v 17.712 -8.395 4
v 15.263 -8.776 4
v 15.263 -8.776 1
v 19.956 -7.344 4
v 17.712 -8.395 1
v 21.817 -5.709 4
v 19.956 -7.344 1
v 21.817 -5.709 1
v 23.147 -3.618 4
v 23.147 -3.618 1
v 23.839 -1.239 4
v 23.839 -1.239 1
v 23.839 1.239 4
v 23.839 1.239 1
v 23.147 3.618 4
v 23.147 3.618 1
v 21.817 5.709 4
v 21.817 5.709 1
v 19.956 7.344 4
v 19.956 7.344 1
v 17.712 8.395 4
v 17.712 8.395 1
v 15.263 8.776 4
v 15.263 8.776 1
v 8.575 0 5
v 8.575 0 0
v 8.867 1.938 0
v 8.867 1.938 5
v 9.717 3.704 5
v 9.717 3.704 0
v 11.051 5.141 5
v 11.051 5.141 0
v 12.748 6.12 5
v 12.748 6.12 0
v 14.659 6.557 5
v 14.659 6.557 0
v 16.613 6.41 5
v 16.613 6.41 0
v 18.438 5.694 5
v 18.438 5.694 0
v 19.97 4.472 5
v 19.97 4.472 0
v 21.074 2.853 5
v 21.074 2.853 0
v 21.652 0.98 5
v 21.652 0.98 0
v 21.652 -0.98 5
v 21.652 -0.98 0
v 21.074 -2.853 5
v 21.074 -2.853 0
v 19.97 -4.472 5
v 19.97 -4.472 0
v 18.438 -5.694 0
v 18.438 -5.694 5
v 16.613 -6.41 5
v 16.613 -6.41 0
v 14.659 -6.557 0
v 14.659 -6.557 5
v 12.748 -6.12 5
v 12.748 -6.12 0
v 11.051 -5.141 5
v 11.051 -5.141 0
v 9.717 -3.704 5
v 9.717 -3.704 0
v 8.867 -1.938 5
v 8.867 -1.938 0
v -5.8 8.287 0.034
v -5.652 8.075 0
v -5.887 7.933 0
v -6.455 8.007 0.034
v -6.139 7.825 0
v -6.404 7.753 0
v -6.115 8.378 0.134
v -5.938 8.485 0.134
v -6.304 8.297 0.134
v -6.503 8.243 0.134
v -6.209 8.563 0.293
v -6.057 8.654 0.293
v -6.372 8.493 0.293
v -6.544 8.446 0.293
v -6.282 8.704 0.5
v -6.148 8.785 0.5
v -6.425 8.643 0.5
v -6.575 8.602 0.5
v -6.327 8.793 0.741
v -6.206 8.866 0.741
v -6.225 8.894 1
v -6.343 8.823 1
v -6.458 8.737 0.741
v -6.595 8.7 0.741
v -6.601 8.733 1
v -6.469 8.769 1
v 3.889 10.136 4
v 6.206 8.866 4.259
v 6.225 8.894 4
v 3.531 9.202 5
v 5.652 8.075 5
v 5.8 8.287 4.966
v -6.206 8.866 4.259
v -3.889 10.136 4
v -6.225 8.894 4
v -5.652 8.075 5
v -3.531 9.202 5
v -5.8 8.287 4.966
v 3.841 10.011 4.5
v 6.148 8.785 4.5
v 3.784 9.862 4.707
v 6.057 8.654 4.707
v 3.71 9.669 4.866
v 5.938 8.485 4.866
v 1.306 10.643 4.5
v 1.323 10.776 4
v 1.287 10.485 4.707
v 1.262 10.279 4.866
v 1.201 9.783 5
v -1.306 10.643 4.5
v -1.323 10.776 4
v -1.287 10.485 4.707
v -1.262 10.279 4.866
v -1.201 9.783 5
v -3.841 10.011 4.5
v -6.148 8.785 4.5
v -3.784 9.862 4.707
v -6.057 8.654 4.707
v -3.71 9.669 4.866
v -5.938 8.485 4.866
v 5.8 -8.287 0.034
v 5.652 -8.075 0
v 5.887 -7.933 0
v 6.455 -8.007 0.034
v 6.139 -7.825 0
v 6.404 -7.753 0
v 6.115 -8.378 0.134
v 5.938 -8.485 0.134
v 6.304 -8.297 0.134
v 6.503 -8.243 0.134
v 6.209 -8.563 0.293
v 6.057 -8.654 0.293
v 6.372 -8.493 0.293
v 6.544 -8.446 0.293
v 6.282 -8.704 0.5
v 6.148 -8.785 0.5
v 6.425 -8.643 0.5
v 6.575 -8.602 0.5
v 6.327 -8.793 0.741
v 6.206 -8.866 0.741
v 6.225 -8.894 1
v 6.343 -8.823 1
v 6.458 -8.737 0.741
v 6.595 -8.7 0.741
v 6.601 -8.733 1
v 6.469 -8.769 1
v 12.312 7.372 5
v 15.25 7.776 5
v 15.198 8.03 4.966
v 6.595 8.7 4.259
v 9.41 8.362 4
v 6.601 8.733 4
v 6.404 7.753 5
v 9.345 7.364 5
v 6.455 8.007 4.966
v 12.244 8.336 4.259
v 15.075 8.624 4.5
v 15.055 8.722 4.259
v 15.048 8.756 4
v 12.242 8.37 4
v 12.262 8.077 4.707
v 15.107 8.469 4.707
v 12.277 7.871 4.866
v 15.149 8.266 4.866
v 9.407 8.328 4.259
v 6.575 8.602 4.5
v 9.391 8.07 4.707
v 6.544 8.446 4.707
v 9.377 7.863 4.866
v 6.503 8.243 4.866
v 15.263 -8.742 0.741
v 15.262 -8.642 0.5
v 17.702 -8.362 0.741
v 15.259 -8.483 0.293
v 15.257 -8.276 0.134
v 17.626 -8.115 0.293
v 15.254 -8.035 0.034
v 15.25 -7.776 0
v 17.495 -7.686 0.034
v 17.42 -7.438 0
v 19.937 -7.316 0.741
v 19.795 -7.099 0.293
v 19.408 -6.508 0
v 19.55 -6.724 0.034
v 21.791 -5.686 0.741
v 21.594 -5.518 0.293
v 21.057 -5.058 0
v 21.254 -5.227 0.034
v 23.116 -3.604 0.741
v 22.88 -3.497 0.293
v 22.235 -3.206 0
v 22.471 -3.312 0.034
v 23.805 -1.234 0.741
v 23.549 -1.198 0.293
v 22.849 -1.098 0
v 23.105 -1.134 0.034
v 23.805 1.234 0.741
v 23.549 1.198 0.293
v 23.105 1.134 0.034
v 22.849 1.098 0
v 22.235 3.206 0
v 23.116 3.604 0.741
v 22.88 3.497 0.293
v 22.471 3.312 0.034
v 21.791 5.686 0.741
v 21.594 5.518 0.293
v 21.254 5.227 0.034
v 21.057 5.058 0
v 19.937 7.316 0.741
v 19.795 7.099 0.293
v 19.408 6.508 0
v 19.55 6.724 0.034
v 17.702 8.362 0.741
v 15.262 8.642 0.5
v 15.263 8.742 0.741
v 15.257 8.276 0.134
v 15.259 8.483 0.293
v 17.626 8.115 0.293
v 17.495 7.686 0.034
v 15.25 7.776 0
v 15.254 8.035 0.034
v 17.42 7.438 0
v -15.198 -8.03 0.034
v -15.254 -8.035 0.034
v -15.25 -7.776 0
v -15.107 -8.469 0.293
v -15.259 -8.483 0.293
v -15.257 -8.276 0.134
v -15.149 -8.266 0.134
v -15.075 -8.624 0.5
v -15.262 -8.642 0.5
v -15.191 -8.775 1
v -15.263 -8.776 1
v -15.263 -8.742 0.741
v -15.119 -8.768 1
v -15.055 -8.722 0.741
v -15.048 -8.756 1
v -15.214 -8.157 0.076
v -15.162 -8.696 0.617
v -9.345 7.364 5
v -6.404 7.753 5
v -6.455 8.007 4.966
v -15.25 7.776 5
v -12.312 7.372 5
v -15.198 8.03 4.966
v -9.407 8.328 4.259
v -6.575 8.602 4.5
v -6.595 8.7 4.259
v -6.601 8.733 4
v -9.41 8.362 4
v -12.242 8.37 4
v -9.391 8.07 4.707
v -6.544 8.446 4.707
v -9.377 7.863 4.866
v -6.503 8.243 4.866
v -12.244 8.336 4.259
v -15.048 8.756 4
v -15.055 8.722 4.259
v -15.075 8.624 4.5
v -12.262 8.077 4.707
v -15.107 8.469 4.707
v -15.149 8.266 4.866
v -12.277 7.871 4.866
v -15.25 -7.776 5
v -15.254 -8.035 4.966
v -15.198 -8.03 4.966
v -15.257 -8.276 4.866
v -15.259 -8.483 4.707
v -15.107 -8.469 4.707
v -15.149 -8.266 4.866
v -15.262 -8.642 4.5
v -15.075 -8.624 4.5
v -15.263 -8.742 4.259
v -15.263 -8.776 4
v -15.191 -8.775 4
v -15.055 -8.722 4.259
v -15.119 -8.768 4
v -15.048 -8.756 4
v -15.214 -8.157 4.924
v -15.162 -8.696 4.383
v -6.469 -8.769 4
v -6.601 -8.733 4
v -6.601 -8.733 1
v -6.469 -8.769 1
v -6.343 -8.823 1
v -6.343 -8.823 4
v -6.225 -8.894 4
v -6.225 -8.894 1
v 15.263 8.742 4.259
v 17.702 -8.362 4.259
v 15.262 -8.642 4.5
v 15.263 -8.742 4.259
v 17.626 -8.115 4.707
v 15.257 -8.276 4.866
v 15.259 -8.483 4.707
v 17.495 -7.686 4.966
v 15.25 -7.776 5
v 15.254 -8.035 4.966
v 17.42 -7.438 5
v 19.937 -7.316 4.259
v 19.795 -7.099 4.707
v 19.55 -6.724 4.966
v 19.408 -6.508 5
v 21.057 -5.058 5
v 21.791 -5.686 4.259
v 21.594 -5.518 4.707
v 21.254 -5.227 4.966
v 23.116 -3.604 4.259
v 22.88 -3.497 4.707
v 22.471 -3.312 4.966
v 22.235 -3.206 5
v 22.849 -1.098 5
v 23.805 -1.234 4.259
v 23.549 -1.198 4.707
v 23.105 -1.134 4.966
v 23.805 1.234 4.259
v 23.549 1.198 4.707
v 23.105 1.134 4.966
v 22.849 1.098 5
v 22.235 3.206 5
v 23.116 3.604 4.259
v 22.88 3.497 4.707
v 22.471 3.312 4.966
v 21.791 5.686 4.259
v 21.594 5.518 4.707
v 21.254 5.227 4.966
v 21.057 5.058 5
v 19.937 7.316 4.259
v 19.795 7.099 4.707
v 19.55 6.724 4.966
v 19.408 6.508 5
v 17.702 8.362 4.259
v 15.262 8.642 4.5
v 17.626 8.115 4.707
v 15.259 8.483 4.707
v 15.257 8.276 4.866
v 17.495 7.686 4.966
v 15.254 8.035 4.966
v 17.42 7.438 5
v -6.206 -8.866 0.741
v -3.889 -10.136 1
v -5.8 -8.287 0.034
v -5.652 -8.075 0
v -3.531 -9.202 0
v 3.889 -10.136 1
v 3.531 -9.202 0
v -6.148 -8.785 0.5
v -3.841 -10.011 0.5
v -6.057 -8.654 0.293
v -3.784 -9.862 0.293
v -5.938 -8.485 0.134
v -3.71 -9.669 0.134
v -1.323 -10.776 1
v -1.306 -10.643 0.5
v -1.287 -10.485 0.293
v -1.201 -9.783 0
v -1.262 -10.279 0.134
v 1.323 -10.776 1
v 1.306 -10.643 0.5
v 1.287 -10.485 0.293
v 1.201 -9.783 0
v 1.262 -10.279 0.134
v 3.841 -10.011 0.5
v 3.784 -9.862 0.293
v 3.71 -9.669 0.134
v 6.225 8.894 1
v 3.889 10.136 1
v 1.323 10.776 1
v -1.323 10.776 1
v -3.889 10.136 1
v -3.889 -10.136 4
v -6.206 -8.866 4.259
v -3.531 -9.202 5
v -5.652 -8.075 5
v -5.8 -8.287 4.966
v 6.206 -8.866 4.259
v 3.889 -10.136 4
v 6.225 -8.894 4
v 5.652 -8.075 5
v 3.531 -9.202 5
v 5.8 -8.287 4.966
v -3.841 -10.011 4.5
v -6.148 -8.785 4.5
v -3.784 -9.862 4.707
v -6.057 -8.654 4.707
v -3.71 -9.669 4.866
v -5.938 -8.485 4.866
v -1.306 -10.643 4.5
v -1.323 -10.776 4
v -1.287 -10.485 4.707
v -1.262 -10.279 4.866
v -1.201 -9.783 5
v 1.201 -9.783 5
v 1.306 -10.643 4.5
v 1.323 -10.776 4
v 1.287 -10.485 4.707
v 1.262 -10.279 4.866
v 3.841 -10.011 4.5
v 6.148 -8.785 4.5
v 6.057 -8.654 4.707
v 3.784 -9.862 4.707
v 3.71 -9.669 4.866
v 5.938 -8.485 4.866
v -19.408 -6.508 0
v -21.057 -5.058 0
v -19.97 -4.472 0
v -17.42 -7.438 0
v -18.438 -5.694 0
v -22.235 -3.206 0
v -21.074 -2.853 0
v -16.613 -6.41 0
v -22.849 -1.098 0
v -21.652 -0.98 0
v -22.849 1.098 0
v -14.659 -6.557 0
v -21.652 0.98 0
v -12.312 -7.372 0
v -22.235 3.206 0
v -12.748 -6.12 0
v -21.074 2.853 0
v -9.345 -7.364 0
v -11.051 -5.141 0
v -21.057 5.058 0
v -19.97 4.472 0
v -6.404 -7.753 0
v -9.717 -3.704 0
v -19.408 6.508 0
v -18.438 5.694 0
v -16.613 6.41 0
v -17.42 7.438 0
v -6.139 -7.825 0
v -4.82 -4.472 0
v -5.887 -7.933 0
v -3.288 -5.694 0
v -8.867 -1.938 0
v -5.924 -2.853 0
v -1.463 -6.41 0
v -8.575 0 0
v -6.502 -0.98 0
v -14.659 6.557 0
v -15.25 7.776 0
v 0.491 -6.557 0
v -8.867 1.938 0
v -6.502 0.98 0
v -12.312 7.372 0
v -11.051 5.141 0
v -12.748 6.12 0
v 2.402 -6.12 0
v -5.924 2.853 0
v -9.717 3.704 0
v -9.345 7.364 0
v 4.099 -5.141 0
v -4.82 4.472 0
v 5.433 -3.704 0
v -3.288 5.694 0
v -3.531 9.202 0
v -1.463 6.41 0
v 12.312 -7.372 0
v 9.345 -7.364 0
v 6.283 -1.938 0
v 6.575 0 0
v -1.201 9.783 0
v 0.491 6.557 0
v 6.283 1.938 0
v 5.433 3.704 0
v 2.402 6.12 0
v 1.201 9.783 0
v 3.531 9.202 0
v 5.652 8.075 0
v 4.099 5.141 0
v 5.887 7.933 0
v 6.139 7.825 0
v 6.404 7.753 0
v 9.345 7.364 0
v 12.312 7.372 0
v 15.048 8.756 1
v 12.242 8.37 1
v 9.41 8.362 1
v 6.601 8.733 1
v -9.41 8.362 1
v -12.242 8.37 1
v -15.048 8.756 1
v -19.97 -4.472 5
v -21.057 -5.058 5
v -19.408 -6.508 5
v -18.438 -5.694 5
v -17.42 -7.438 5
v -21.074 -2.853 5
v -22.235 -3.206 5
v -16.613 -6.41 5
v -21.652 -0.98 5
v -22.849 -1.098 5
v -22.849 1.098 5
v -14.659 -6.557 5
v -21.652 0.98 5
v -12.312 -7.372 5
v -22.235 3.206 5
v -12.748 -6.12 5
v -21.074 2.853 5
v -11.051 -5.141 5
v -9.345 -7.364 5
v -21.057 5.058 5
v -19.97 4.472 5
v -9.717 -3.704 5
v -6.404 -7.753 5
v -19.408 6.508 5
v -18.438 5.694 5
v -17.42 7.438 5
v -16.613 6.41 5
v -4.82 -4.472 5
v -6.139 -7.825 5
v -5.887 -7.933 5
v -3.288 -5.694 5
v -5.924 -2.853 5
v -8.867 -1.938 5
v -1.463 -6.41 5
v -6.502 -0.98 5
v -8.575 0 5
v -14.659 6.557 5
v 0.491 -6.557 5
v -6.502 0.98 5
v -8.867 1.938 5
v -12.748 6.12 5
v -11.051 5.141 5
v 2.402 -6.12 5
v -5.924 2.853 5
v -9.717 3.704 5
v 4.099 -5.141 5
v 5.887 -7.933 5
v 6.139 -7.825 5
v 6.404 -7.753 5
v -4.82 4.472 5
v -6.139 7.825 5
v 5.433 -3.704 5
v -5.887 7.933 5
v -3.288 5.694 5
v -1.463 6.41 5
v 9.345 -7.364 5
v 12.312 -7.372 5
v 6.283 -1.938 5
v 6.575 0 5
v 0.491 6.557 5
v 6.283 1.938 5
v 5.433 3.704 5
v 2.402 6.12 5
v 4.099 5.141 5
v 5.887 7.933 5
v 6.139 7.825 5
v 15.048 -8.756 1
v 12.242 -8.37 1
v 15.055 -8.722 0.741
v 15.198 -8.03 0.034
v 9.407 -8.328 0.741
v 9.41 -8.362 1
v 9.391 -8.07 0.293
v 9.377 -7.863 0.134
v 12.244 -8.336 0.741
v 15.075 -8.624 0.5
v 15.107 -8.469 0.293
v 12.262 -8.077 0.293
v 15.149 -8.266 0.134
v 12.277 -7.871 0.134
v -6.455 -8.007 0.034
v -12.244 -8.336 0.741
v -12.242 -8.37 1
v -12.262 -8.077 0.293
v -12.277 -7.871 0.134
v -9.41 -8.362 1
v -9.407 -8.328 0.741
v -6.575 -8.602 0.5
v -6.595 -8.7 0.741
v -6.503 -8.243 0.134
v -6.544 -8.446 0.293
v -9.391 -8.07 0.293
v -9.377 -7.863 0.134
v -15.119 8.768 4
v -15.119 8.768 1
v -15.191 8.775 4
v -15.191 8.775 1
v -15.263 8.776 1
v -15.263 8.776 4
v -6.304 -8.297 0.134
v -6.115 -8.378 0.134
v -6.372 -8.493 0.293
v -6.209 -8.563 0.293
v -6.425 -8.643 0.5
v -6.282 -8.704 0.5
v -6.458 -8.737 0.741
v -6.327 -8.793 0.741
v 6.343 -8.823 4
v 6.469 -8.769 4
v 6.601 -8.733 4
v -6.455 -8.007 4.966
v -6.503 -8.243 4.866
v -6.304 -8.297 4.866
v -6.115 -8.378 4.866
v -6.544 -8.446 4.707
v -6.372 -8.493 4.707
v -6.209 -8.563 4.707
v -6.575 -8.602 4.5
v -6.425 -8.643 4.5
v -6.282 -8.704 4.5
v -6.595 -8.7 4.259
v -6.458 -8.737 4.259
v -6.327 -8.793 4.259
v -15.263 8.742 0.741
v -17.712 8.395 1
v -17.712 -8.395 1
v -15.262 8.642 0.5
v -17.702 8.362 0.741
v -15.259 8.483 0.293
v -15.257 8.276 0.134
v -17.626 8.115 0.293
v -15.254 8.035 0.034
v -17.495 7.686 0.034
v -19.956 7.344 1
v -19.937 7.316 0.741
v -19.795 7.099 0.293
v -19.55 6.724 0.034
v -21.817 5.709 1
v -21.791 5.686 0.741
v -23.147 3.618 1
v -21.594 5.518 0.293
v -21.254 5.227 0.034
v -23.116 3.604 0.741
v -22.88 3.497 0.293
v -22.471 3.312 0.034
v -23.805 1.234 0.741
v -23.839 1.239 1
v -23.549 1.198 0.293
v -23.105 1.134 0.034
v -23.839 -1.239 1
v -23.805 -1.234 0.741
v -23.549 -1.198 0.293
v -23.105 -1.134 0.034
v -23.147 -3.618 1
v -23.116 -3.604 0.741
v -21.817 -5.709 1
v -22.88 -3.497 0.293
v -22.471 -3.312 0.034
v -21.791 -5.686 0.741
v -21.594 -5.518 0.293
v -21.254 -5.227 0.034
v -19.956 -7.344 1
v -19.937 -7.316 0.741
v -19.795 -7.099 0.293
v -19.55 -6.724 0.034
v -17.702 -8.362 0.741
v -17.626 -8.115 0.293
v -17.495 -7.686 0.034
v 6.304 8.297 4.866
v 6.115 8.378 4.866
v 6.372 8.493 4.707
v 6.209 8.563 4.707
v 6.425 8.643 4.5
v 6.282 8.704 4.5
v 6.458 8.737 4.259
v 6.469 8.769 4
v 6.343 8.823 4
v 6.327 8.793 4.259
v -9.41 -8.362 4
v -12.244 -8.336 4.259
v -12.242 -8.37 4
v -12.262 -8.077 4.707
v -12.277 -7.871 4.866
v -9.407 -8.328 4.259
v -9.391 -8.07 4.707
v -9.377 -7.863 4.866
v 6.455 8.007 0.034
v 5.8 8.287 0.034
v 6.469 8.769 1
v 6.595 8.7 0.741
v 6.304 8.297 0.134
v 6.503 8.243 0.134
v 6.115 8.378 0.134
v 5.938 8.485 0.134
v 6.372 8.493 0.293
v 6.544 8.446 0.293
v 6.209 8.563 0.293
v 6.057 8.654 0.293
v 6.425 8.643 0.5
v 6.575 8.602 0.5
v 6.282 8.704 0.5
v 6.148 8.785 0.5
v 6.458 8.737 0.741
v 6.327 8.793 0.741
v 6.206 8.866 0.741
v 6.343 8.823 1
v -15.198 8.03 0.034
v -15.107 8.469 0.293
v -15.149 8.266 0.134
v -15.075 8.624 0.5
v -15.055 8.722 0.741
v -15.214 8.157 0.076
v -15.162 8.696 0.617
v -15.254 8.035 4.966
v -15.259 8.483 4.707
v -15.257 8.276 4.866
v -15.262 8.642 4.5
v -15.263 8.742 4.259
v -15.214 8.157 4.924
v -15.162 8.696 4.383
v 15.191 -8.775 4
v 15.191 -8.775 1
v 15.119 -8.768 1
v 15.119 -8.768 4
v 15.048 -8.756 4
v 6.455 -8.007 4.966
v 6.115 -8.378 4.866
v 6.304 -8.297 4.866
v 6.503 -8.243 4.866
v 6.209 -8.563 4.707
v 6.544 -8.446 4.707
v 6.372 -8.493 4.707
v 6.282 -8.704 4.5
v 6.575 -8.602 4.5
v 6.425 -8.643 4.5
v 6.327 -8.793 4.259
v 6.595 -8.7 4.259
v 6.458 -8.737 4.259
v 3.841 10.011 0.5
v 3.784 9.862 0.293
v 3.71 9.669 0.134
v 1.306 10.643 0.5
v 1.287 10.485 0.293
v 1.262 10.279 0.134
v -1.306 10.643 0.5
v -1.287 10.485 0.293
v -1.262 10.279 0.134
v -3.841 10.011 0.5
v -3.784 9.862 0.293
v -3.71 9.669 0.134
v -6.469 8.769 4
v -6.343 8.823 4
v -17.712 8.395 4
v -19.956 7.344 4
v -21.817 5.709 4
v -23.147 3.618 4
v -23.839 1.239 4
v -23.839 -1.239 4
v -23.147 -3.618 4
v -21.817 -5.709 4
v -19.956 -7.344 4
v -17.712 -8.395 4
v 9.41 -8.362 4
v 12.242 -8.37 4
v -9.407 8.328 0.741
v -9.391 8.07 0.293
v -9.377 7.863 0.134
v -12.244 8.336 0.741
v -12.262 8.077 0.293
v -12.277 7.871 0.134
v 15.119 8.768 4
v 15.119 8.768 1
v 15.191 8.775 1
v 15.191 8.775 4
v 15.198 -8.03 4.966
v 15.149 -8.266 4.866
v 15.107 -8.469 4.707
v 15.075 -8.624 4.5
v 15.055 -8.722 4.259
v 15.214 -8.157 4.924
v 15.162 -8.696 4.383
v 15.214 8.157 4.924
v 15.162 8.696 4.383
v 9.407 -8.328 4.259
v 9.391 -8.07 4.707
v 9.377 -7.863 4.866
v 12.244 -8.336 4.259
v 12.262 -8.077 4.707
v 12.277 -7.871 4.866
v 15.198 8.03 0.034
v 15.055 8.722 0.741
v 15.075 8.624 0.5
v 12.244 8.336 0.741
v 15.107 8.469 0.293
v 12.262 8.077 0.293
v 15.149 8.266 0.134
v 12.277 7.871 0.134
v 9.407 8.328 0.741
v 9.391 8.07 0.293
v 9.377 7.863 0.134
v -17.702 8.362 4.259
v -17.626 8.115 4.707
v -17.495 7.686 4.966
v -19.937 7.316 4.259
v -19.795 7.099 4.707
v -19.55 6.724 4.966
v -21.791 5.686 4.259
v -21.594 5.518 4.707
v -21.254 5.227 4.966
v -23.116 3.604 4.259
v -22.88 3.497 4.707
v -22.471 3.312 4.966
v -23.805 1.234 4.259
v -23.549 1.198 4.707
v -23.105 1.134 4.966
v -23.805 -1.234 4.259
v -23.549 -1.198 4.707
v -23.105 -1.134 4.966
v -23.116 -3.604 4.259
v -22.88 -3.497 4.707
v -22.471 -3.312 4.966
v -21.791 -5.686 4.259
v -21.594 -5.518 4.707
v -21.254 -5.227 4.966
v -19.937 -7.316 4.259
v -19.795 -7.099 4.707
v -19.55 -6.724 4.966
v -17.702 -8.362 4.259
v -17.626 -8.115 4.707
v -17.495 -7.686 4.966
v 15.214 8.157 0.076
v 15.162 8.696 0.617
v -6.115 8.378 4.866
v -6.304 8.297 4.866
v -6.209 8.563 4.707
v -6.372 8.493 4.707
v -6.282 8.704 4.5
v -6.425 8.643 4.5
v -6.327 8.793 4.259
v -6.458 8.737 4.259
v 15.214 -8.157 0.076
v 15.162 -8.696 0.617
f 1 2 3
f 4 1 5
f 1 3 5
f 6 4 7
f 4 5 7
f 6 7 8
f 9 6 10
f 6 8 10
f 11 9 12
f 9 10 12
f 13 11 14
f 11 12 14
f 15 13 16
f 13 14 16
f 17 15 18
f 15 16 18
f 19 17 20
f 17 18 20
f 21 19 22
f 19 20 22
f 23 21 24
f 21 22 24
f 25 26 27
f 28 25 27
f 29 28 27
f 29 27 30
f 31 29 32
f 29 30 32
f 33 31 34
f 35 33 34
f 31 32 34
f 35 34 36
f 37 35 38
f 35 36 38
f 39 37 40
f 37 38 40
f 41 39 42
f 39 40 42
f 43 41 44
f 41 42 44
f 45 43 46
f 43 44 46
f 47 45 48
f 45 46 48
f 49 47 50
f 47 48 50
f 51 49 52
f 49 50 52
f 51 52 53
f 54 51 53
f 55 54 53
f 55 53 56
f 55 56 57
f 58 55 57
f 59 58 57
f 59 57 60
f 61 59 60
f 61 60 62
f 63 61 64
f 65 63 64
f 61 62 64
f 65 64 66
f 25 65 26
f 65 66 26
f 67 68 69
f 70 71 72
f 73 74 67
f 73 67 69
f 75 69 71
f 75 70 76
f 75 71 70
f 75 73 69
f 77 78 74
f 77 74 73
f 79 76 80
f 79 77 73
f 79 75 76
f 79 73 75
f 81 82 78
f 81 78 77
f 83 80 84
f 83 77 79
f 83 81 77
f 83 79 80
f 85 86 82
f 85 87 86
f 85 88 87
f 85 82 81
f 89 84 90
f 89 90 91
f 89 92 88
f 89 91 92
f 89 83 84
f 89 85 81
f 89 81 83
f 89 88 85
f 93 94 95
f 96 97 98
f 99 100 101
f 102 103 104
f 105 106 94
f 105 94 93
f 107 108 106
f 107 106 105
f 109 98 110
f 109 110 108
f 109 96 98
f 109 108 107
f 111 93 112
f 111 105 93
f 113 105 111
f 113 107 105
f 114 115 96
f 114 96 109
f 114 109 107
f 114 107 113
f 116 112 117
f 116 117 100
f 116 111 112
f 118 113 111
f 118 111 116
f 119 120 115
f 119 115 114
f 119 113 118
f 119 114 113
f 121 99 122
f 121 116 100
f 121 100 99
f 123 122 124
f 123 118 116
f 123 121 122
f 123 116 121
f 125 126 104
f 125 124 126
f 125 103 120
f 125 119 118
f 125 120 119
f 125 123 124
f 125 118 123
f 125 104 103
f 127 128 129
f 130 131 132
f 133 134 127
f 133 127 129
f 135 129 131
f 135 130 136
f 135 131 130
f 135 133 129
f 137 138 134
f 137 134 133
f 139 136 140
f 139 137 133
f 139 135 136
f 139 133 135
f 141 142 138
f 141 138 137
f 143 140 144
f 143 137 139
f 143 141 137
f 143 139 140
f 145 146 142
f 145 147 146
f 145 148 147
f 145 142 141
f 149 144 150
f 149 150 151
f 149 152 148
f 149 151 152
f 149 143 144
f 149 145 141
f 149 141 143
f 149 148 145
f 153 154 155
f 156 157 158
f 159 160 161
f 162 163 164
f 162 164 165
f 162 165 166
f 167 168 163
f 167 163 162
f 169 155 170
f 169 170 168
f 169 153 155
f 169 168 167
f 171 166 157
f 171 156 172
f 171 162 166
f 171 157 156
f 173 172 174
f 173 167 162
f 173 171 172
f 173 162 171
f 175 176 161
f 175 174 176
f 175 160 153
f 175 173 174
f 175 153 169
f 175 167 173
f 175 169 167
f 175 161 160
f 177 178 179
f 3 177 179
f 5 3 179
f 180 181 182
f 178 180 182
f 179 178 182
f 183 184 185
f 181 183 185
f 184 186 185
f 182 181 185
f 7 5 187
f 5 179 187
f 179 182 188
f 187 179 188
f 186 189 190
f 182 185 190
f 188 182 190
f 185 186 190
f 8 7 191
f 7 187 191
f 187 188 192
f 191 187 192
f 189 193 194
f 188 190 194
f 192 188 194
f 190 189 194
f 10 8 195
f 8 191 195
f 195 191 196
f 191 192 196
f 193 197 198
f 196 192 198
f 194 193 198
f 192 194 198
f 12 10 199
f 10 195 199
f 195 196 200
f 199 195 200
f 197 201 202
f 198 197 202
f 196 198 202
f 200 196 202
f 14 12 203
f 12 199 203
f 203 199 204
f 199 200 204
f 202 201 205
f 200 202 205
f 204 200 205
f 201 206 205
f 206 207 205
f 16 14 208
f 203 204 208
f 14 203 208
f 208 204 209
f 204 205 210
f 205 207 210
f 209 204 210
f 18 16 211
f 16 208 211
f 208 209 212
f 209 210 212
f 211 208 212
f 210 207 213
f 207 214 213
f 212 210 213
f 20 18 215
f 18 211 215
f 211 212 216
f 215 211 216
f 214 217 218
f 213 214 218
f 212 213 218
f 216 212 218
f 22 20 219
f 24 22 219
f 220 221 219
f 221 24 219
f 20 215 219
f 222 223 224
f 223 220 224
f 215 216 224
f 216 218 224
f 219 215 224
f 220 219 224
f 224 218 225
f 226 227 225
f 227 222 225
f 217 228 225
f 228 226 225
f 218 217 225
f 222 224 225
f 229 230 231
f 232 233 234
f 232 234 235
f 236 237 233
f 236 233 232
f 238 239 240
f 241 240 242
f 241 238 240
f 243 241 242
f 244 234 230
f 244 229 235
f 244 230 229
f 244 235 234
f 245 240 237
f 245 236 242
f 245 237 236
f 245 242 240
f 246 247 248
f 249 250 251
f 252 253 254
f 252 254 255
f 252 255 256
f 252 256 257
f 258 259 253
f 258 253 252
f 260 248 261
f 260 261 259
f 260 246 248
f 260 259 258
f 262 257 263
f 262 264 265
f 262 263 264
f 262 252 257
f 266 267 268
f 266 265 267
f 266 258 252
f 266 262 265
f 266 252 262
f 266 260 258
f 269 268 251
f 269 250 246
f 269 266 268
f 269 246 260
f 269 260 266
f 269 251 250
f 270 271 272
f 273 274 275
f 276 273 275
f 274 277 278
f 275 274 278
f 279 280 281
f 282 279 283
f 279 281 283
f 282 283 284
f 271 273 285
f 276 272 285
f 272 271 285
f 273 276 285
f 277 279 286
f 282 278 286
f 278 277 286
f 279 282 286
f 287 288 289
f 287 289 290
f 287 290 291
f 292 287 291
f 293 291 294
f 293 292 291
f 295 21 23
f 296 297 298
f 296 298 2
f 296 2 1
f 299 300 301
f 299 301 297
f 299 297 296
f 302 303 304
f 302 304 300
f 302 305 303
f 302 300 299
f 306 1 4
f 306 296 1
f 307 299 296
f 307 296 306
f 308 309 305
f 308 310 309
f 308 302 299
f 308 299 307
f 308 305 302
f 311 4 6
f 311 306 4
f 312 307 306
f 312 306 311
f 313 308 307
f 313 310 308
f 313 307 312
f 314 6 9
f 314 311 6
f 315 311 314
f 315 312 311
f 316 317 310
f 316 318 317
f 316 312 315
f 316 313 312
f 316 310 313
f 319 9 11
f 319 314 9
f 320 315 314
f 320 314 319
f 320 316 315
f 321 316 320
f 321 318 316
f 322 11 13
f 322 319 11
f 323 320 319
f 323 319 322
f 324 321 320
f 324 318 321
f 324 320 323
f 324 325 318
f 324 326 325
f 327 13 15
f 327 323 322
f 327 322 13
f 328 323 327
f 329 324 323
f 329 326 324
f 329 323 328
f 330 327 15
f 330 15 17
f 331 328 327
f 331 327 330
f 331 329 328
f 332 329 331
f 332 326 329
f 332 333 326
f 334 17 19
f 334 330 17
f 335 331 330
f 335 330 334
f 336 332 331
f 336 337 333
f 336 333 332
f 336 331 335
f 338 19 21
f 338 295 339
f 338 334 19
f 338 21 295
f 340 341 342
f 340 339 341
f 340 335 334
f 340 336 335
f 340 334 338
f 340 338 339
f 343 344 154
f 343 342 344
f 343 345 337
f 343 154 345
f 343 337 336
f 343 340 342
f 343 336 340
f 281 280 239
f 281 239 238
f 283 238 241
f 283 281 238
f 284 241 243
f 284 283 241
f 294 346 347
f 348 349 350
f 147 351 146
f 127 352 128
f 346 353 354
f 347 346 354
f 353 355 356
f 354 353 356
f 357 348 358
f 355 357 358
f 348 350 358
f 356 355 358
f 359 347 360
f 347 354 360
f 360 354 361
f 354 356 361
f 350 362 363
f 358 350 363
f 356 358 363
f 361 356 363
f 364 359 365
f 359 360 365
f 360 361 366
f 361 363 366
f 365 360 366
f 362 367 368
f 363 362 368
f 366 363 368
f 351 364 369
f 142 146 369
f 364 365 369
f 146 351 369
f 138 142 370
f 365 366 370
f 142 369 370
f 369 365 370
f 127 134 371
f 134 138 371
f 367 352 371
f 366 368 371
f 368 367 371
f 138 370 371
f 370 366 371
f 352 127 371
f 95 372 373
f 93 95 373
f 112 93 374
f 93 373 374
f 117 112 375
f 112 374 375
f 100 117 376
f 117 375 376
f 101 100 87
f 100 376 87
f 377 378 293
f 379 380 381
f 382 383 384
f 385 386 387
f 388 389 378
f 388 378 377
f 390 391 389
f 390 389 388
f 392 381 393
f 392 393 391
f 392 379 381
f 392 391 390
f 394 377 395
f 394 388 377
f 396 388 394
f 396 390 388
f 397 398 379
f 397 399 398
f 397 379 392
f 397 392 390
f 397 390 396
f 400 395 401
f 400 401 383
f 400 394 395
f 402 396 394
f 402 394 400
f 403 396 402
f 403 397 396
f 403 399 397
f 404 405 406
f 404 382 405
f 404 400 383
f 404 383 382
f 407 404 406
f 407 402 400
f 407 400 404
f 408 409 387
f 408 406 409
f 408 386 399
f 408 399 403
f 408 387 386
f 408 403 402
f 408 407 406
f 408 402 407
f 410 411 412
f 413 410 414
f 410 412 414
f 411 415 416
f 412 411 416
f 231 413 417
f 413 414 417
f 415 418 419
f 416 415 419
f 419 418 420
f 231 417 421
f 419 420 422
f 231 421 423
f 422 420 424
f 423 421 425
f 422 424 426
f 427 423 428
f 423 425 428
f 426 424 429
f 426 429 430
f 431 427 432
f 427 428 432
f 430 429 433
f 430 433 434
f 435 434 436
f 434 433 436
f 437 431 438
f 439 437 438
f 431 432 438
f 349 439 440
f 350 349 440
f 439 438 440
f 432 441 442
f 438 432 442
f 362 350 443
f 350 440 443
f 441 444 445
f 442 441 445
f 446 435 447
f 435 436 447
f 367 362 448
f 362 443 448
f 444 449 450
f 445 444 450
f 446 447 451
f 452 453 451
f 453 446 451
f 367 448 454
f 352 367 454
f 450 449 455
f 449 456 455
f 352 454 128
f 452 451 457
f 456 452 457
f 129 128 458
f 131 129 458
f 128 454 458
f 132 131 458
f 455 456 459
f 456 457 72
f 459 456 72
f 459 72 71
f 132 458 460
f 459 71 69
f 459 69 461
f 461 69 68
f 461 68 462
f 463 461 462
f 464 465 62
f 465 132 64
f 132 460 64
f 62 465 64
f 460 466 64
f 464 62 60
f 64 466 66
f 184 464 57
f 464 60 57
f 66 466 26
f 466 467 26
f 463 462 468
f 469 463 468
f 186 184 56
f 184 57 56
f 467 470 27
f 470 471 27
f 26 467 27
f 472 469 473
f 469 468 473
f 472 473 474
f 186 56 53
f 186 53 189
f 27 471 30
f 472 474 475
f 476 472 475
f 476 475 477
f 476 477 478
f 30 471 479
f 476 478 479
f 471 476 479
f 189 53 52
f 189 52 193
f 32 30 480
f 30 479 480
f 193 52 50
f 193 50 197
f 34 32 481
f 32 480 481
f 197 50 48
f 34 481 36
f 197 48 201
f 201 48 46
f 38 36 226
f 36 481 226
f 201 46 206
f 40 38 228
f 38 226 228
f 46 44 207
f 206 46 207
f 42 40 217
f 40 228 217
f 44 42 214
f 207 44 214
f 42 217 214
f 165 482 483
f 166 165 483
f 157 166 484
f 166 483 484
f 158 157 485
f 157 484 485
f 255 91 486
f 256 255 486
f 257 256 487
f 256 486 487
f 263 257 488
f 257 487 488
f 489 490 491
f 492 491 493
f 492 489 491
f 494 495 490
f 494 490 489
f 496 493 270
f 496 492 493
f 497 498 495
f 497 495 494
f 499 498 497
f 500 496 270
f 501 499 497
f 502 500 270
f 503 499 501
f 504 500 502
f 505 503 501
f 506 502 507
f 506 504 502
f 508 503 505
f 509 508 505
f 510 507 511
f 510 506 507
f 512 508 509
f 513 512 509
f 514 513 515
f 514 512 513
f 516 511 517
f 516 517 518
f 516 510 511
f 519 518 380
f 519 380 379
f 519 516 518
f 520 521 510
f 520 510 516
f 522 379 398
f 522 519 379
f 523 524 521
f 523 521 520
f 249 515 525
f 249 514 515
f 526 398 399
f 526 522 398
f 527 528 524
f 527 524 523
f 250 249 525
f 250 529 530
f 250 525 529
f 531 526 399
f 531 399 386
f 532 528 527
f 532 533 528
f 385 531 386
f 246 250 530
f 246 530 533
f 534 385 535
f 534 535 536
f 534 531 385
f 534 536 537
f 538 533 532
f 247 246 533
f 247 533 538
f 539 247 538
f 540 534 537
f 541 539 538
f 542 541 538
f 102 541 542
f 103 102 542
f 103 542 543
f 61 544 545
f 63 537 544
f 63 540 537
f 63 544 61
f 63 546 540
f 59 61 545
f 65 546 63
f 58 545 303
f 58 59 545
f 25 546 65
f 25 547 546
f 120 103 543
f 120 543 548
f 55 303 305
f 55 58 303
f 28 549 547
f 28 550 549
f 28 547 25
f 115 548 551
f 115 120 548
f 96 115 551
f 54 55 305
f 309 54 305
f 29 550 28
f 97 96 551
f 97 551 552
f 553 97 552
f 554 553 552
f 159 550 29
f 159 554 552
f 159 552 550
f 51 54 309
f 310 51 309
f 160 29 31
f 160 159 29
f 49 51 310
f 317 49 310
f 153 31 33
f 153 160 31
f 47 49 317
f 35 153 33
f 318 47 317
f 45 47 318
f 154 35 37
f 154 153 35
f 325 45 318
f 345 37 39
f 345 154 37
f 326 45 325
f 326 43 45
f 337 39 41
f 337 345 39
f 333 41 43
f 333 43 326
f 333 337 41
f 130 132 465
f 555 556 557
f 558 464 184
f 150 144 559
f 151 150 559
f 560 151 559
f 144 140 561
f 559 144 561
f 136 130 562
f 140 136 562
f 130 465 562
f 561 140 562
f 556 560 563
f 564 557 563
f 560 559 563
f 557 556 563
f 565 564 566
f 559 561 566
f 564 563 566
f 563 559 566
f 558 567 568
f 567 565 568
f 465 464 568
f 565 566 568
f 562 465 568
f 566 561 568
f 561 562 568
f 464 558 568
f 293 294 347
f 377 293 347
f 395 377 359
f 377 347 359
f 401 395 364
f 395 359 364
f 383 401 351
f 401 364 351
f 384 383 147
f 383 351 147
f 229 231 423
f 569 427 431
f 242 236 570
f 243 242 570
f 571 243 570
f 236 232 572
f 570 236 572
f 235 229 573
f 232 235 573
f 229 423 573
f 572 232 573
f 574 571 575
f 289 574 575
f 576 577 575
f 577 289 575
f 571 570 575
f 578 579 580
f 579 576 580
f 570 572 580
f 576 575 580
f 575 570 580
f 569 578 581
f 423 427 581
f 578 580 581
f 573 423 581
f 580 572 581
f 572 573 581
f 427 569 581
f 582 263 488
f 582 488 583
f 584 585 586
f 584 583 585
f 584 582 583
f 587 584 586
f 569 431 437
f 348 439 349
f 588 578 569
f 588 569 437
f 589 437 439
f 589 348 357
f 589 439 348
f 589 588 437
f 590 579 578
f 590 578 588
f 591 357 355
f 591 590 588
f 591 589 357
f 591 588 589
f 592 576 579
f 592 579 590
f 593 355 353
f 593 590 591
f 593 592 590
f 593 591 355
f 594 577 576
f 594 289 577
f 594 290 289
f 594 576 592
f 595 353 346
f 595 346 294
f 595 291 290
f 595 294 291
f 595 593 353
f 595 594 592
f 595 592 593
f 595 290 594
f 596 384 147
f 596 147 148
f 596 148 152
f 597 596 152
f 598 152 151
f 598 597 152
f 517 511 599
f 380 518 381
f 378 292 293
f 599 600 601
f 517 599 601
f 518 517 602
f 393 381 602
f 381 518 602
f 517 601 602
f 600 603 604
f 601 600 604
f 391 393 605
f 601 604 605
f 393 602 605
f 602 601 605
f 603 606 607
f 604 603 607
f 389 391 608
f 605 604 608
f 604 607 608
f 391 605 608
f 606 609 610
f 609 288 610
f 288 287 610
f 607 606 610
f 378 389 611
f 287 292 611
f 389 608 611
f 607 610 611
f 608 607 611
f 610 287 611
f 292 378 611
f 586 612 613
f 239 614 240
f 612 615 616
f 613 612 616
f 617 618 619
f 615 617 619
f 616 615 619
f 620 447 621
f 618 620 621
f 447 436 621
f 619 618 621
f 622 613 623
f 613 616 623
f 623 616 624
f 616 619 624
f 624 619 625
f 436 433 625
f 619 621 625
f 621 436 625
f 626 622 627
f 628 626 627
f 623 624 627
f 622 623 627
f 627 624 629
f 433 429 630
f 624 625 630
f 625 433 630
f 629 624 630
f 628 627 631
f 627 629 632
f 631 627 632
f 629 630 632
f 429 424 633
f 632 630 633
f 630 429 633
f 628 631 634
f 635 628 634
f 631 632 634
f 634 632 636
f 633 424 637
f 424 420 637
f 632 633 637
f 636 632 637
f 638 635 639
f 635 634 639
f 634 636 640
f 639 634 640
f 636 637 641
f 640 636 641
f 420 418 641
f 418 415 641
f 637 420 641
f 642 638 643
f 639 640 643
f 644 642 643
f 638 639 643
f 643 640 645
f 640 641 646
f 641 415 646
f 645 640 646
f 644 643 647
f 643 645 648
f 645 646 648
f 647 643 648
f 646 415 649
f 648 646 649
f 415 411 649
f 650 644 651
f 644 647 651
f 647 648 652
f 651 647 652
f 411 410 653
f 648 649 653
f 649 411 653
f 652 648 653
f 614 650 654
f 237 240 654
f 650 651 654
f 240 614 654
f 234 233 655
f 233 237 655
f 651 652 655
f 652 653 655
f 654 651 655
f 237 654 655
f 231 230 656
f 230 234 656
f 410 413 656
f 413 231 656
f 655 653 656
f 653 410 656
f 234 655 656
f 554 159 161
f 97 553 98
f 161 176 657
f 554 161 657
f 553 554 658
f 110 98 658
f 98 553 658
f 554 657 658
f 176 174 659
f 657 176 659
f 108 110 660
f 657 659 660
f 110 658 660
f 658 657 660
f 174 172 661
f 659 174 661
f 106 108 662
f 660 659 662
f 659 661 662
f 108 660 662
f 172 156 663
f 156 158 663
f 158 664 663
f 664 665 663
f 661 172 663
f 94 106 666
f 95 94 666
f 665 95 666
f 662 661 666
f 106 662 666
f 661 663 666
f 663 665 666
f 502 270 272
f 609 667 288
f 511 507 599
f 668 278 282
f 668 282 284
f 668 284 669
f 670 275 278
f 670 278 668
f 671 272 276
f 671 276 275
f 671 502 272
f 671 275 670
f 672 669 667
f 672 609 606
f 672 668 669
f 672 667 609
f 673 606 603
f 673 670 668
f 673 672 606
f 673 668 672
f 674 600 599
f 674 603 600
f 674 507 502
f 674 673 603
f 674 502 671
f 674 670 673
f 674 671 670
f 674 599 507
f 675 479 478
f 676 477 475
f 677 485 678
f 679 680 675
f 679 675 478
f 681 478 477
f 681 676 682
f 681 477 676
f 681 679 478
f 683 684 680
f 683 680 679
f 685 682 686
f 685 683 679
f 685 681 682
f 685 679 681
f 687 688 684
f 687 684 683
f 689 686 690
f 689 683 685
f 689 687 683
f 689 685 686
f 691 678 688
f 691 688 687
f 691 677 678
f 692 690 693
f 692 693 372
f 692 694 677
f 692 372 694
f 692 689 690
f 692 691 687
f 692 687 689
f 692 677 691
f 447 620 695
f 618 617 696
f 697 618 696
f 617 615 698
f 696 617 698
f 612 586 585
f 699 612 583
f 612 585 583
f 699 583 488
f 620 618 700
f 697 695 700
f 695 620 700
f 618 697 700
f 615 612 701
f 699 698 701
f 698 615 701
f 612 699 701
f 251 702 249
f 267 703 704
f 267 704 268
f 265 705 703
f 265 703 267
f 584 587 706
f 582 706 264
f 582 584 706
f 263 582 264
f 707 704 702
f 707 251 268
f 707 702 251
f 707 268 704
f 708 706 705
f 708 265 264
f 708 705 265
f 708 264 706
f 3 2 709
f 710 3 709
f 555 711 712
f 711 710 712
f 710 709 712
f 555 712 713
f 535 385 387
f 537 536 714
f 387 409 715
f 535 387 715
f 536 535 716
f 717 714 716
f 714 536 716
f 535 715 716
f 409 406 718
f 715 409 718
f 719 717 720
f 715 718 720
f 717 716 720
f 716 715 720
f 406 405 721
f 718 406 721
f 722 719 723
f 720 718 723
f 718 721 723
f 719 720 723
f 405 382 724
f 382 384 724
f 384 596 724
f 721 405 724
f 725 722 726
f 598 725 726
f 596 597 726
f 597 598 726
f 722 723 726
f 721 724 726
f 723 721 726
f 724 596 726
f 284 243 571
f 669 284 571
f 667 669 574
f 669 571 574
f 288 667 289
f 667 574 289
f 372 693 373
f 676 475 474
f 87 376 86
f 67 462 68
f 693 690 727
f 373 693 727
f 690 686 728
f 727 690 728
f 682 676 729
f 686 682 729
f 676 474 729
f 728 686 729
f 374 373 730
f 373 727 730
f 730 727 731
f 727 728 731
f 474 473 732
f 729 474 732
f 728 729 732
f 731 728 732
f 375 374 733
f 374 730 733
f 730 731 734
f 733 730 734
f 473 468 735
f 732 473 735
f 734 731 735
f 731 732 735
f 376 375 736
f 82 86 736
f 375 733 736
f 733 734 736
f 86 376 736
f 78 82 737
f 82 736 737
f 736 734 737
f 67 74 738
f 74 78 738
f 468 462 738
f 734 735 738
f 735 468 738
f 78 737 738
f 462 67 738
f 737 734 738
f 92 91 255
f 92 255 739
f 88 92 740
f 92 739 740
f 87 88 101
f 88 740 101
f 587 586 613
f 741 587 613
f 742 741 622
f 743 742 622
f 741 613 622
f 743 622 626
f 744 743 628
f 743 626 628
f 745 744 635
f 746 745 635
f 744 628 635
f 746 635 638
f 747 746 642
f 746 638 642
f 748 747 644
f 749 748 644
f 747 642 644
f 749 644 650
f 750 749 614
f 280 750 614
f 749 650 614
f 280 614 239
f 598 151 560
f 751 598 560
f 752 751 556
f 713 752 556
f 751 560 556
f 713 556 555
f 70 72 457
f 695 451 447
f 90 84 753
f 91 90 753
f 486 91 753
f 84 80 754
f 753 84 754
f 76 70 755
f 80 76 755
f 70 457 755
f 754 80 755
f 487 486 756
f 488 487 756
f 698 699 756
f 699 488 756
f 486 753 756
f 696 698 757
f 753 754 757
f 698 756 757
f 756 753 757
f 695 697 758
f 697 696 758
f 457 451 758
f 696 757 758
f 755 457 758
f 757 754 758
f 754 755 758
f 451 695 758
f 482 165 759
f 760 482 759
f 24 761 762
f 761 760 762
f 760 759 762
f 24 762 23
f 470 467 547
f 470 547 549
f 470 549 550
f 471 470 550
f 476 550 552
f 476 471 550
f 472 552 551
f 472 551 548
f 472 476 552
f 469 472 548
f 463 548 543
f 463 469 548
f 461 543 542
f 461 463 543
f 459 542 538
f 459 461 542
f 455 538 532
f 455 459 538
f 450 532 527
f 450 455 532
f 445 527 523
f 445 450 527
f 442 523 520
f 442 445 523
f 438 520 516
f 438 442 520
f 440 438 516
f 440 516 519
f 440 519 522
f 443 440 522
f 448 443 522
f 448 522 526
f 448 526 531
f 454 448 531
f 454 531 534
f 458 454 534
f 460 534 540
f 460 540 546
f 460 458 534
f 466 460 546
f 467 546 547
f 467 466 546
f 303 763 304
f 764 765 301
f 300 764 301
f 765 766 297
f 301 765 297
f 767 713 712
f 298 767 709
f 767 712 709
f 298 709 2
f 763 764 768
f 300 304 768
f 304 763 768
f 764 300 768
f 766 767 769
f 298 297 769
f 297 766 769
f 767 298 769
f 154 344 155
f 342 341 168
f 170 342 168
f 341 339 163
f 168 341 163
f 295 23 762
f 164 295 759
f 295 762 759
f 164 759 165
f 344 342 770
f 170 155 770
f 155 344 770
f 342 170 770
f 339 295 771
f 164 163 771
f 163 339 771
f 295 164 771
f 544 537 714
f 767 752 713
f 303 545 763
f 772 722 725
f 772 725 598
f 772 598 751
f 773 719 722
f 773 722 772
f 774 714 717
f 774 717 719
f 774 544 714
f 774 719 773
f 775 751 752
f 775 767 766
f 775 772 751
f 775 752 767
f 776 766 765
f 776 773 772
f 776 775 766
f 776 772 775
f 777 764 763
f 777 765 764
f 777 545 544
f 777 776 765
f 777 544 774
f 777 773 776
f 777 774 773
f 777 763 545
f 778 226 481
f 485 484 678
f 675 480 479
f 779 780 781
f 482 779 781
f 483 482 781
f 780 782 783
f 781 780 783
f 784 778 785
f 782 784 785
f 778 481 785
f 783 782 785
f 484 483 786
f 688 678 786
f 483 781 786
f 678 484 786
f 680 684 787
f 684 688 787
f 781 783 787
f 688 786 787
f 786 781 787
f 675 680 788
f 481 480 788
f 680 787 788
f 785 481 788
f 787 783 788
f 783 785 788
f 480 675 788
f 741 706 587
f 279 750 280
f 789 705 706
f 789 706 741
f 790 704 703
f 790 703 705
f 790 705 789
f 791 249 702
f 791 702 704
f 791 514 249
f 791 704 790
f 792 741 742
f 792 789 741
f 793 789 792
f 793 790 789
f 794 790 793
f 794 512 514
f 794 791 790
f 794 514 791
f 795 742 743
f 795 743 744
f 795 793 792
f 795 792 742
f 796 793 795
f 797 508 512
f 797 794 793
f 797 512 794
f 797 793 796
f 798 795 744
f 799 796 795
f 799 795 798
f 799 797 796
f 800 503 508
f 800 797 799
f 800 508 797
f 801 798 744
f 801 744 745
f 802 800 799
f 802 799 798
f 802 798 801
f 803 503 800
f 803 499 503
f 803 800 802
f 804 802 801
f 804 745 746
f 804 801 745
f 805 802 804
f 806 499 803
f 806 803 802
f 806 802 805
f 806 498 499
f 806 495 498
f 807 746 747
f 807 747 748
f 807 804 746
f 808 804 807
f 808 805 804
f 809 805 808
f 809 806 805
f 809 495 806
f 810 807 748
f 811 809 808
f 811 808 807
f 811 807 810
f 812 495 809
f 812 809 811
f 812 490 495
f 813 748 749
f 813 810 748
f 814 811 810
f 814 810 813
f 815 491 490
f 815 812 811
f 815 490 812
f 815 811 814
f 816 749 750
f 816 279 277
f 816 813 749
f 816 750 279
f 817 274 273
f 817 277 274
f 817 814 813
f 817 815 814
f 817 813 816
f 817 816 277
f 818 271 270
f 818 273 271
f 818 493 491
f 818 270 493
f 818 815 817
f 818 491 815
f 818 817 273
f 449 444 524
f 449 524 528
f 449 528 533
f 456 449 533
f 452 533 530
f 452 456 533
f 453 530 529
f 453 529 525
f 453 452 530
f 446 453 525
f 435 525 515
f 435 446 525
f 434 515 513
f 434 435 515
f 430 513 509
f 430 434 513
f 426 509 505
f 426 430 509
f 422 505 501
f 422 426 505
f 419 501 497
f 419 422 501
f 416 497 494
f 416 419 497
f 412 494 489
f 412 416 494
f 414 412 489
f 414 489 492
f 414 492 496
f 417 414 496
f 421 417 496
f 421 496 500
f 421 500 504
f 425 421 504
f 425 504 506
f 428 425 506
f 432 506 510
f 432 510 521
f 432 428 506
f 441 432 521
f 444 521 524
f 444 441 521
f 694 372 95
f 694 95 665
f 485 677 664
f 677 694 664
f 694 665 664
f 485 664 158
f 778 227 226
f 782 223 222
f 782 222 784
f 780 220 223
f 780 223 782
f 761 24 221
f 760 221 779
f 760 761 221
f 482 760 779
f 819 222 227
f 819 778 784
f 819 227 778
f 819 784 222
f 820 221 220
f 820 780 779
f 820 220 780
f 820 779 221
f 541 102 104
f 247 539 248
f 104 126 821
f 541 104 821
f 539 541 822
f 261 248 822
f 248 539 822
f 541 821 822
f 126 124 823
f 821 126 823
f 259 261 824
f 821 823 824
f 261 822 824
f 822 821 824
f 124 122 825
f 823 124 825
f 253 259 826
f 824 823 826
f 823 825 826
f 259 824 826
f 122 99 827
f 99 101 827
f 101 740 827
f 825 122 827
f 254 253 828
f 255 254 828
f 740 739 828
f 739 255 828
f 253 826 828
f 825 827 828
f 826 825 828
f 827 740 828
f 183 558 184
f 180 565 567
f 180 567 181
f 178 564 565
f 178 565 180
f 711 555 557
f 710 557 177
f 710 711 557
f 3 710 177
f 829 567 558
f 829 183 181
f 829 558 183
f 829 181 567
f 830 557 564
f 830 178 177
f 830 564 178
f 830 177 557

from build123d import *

# Parameters (mm, degrees)
F0_R     = 6.575
F1_DEPTH = 5
F2_R     = 1


with BuildPart() as f1:
    # F0 (on Top) → F1 (new body)
    with BuildSketch(Plane.XY):
        with BuildLine():
            ThreePointArc((-6.389604, 8.776923), (-10.769802, 8.318304), (-15.15, 8.776923))
            ThreePointArc((-15.15, 8.776923), (-23.926923, 0), (-15.15, -8.776923))
            ThreePointArc((-15.15, -8.776923), (-10.769802, -8.318304), (-6.389604, -8.776923))
            ThreePointArc((-6.389604, -8.776923), (0, -10.856399), (6.389604, -8.776923))
            ThreePointArc((6.389604, -8.776923), (10.769802, -8.318304), (15.15, -8.776923))
            ThreePointArc((15.15, -8.776923), (23.926923, 0), (15.15, 8.776923))
            ThreePointArc((15.15, 8.776923), (10.769802, 8.318304), (6.389604, 8.776923))
            ThreePointArc((6.389604, 8.776923), (0, 10.856399), (-6.389604, 8.776923))
        make_face()
        with Locations((-15.15, 0)):
            Circle(F0_R, mode=Mode.SUBTRACT)
        Circle(F0_R, mode=Mode.SUBTRACT)
        with BuildLine():
            ThreePointArc((21.725, 0), (15.15, -6.575), (8.575, 0))
            ThreePointArc((8.575, 0), (15.15, 6.575), (21.725, 0))
        make_face(mode=Mode.SUBTRACT)
    extrude(amount=F1_DEPTH)

    # F2
    f2_edges = [f1.edges().sort_by_distance(p)[0] for p in [
        (-15.15, 8.776923, 2.5),
        (-15.15, -8.776923, 2.5),
        (-23.926923, 0, 0),
        (-23.926923, 0, 5),
        (-6.389604, -8.776923, 2.5),
        (-10.769802, -8.318304, 0),
        (-10.769802, -8.318304, 5),
        (6.389604, -8.776923, 2.5),
        (0, -10.856399, 0),
        (0, -10.856399, 5),
        (15.15, -8.776923, 2.5),
        (10.769802, -8.318304, 0),
        (10.769802, -8.318304, 5),
        (15.15, 8.776923, 2.5),
        (23.926923, 0, 0),
        (23.926923, 0, 5),
        (6.389604, 8.776923, 2.5),
        (10.769802, 8.318304, 0),
        (10.769802, 8.318304, 5),
        (-6.389604, 8.776923, 2.5),
        (0, 10.856399, 0),
        (0, 10.856399, 5),
        (-10.769802, 8.318304, 0),
        (-10.769802, 8.318304, 5),
    ]]
    fillet(f2_edges, radius=F2_R)


solid = f1.part
